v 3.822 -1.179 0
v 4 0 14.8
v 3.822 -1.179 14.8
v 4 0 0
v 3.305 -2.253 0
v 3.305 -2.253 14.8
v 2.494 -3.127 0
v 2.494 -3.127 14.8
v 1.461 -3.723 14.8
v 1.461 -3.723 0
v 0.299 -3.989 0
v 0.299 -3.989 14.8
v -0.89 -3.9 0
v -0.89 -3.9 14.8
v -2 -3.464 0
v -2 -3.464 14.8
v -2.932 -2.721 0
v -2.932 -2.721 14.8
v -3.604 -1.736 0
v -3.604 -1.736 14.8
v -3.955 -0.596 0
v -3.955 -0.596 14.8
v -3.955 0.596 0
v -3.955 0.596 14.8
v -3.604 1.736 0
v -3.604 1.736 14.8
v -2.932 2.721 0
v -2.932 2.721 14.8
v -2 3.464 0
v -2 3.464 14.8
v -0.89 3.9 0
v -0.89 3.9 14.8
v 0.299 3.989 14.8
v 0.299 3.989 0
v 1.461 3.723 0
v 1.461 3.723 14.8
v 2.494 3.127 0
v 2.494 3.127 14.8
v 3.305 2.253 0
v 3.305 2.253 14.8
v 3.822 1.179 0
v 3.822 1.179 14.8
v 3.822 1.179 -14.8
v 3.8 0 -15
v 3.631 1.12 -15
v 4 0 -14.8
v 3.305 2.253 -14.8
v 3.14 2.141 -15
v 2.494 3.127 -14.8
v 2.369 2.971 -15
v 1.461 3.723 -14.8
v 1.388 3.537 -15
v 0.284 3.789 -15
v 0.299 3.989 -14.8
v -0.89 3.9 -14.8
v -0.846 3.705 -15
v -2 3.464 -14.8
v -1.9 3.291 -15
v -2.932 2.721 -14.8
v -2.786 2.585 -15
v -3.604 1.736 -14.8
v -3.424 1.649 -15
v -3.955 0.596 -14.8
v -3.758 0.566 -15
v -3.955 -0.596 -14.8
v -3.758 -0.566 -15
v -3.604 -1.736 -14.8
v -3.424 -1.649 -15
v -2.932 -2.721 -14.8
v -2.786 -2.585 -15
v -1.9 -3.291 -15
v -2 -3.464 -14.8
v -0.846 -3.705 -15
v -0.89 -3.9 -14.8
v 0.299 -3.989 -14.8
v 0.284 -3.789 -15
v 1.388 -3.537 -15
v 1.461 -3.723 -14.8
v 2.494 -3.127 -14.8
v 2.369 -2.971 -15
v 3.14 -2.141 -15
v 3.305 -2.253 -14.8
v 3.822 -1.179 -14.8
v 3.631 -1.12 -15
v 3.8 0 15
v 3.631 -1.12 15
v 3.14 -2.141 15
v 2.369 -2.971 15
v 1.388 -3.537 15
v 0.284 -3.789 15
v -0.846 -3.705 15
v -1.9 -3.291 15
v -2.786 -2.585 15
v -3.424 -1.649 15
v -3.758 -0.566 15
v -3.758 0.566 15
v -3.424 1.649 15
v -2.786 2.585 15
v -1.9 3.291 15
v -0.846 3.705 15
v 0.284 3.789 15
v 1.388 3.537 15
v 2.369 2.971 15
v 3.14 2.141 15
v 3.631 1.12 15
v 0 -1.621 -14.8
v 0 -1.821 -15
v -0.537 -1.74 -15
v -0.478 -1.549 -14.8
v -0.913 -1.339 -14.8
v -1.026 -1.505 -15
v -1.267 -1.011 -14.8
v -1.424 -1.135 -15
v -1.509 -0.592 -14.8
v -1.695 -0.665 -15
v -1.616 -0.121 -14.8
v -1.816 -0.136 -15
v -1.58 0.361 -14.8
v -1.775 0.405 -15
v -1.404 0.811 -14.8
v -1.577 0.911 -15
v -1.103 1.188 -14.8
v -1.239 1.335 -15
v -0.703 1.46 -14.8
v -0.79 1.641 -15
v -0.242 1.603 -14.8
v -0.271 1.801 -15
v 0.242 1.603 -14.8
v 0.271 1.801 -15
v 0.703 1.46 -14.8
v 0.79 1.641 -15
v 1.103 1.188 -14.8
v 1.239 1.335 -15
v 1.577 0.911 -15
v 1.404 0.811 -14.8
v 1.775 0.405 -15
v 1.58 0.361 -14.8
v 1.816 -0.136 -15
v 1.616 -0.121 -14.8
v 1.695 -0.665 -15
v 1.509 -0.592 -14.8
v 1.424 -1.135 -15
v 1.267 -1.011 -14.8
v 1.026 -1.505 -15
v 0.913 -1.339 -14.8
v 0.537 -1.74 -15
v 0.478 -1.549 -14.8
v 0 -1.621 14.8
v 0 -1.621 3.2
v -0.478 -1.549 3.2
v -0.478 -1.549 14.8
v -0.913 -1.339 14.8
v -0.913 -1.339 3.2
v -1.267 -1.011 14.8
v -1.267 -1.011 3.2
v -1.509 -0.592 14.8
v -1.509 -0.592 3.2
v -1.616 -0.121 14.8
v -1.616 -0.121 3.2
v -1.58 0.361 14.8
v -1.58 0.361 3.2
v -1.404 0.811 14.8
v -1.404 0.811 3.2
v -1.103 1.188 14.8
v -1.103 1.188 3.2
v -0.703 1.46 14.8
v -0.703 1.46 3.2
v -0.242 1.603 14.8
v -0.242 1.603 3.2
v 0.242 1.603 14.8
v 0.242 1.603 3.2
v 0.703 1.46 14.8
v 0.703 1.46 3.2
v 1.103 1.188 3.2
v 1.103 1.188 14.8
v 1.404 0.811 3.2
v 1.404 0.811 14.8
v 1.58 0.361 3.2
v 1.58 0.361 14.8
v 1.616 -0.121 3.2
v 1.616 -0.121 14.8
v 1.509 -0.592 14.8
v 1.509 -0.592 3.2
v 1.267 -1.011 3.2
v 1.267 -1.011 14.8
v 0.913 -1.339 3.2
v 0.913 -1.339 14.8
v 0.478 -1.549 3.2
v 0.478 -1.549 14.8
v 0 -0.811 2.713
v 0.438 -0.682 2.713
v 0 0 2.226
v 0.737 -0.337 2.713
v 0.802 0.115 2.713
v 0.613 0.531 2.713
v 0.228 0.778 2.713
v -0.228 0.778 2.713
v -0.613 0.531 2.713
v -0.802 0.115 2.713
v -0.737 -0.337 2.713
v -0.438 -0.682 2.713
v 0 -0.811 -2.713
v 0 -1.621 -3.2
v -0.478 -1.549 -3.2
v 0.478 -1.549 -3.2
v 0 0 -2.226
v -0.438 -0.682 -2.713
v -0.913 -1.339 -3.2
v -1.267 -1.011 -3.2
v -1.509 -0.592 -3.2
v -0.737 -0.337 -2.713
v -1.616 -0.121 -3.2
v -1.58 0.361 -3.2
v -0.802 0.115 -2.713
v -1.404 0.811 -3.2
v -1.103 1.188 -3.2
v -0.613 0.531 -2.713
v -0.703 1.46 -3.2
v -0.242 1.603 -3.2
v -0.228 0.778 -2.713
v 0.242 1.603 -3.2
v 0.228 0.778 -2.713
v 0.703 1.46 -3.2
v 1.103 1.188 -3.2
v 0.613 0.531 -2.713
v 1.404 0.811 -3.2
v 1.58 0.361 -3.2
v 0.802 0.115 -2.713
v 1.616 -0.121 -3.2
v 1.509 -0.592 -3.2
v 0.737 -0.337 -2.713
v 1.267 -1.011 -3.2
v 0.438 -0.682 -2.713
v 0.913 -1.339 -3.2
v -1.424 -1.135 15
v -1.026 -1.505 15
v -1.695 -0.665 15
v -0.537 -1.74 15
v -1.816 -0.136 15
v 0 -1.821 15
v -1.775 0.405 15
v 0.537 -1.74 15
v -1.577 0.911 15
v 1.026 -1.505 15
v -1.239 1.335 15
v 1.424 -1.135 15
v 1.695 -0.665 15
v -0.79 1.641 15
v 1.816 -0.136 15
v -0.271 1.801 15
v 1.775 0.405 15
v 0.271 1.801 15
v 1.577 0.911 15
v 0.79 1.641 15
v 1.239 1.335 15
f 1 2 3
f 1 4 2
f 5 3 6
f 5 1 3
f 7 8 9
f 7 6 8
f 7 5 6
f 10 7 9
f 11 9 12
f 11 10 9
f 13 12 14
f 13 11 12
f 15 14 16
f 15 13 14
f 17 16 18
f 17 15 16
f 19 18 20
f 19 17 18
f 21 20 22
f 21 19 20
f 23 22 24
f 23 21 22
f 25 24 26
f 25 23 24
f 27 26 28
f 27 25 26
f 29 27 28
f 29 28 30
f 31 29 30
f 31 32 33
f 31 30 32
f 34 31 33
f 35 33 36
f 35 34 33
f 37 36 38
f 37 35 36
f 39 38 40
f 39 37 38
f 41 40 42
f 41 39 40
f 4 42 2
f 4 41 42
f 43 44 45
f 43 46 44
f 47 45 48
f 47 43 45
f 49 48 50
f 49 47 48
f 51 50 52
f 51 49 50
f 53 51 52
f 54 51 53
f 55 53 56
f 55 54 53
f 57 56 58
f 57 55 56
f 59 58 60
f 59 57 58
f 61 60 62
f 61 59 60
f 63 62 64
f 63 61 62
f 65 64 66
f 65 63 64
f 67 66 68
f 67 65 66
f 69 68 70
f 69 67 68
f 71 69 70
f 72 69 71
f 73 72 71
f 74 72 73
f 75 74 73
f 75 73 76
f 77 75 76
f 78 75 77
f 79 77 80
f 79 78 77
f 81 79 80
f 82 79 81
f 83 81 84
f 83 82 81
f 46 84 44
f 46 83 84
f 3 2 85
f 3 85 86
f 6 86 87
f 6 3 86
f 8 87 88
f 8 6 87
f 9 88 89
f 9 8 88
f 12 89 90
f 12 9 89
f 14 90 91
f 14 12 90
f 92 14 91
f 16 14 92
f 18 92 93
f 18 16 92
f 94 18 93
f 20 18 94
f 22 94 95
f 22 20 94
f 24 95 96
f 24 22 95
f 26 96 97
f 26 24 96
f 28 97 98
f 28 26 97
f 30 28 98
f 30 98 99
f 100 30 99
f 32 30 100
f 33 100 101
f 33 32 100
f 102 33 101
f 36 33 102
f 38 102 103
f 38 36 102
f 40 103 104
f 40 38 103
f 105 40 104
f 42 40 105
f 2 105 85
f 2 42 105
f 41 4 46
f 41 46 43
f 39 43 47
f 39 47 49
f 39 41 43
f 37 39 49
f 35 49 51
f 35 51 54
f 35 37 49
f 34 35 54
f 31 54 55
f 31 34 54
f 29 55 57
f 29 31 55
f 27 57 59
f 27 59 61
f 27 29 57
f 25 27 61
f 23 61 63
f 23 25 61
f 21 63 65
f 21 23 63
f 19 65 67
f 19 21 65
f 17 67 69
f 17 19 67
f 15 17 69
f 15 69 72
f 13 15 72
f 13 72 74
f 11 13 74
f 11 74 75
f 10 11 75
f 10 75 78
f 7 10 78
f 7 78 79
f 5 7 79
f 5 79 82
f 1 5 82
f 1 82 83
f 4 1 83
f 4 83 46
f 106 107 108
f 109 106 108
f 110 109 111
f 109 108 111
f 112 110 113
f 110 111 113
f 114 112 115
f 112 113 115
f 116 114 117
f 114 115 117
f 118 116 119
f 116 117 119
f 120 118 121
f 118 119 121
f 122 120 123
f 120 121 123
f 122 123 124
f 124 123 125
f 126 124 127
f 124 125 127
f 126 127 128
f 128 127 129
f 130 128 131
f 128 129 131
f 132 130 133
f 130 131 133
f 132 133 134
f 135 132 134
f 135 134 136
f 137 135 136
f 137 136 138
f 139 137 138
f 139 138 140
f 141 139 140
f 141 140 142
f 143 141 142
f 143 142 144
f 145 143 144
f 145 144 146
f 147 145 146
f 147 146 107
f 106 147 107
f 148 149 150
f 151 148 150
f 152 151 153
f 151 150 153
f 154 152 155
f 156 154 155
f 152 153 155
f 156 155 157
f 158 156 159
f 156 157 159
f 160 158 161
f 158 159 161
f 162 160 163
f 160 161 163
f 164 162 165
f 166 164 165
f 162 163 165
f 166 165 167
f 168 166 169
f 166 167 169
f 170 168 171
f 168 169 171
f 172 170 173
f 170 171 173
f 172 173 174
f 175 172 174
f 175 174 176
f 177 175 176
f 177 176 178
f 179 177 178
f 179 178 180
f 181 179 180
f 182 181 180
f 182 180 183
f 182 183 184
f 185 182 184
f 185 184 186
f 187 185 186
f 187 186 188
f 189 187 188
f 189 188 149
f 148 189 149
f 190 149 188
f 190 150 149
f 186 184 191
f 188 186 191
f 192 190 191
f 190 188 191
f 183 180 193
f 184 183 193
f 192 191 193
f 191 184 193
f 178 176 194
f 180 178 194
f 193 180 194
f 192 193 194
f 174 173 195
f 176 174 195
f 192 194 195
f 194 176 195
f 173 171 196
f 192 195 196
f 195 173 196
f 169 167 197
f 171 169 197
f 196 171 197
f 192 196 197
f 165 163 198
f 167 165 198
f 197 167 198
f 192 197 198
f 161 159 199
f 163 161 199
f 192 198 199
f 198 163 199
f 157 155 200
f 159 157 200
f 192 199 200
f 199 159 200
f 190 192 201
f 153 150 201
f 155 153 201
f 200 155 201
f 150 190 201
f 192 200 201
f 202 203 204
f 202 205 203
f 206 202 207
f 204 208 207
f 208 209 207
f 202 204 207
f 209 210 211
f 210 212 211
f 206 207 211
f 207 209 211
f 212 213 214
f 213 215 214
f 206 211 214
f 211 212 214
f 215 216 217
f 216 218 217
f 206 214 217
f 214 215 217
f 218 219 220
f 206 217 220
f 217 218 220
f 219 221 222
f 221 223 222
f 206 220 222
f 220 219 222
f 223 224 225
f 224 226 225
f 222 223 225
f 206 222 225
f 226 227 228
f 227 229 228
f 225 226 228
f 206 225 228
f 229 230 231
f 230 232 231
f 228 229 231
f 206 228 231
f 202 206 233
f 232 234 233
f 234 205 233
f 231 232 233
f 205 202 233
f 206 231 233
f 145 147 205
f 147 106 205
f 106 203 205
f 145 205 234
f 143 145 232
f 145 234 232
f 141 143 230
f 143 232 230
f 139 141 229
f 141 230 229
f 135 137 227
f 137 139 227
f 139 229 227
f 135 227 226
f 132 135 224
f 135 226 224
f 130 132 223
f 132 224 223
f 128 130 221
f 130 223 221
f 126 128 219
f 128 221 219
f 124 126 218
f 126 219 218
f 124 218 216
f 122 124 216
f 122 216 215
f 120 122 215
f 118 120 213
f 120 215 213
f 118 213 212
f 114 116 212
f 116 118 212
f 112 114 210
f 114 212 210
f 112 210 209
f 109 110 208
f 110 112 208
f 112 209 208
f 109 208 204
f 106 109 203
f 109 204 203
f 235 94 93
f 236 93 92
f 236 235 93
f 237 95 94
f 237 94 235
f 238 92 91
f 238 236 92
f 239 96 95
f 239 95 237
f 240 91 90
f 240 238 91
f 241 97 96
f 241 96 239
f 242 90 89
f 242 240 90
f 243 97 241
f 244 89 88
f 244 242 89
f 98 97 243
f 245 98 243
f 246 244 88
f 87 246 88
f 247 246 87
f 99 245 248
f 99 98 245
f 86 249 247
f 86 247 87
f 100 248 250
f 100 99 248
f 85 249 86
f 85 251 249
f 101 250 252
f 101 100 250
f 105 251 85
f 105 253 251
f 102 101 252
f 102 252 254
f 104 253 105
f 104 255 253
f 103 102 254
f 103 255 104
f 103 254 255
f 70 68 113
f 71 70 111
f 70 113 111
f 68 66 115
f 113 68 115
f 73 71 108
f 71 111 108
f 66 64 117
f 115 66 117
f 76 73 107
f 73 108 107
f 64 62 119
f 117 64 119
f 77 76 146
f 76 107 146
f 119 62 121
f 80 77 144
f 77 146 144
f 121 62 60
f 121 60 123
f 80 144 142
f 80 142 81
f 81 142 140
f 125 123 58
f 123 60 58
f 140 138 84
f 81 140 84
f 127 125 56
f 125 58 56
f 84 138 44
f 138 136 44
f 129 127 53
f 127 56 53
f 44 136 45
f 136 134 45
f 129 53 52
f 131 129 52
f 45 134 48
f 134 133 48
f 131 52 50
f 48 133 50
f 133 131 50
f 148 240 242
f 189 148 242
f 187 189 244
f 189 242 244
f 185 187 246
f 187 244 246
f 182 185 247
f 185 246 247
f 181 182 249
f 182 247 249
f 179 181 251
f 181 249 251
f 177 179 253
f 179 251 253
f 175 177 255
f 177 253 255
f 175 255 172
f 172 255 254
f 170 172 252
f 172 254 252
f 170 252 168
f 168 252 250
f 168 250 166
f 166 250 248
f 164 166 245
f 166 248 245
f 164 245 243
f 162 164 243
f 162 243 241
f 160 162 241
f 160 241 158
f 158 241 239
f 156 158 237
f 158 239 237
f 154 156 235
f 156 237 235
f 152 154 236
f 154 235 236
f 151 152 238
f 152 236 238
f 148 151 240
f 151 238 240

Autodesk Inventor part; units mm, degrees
ref_plane "YZ Plane" through (0, 0, 0) normal (1, 0, 0) x (0, 1, 0)
ref_plane "XZ Plane" through (0, 0, 0) normal (0, 1, 0) x (-1, 0, 0)
ref_plane "XY Plane" through (0, 0, 0) normal (0, 0, 1) x (1, 0, 0)
sketch "スケッチ1" plane through (0, 0, 0) normal (0, 0, 1) x (1, 0, 0)
  circle A0 centre (0, 0) radius 4
  dimension "d13" = 8
extrude "押し出し1" add sketch "スケッチ1" along normal mid plane 30
sketch "スケッチ2" plane through (0, 0, 15) normal (0, 0, 1) x (1, 0, 0)
  point P0 (0, 0)
  point P1 (0, 0)
hole "穴1" at (0, 0, 15) direction (0, 0, -1) diameter 3.242 depth 11.8 tip angle 118 thread size "M4x0.7" class "6H" standard "ANSI Metric M Profile"
mirror "ミラー1" about plane through (0, 0, 0) normal (0, 0, 1) of "穴1"
chamfer "面取り1" distance 0.2 angle 45 4 edges at (0, 1.621, 15) (-4, 0, 15) (-4, 0, -15) (0, 1.621, -15)
properties part number "unir-spacer2" material "鋼、炭素鋼"
